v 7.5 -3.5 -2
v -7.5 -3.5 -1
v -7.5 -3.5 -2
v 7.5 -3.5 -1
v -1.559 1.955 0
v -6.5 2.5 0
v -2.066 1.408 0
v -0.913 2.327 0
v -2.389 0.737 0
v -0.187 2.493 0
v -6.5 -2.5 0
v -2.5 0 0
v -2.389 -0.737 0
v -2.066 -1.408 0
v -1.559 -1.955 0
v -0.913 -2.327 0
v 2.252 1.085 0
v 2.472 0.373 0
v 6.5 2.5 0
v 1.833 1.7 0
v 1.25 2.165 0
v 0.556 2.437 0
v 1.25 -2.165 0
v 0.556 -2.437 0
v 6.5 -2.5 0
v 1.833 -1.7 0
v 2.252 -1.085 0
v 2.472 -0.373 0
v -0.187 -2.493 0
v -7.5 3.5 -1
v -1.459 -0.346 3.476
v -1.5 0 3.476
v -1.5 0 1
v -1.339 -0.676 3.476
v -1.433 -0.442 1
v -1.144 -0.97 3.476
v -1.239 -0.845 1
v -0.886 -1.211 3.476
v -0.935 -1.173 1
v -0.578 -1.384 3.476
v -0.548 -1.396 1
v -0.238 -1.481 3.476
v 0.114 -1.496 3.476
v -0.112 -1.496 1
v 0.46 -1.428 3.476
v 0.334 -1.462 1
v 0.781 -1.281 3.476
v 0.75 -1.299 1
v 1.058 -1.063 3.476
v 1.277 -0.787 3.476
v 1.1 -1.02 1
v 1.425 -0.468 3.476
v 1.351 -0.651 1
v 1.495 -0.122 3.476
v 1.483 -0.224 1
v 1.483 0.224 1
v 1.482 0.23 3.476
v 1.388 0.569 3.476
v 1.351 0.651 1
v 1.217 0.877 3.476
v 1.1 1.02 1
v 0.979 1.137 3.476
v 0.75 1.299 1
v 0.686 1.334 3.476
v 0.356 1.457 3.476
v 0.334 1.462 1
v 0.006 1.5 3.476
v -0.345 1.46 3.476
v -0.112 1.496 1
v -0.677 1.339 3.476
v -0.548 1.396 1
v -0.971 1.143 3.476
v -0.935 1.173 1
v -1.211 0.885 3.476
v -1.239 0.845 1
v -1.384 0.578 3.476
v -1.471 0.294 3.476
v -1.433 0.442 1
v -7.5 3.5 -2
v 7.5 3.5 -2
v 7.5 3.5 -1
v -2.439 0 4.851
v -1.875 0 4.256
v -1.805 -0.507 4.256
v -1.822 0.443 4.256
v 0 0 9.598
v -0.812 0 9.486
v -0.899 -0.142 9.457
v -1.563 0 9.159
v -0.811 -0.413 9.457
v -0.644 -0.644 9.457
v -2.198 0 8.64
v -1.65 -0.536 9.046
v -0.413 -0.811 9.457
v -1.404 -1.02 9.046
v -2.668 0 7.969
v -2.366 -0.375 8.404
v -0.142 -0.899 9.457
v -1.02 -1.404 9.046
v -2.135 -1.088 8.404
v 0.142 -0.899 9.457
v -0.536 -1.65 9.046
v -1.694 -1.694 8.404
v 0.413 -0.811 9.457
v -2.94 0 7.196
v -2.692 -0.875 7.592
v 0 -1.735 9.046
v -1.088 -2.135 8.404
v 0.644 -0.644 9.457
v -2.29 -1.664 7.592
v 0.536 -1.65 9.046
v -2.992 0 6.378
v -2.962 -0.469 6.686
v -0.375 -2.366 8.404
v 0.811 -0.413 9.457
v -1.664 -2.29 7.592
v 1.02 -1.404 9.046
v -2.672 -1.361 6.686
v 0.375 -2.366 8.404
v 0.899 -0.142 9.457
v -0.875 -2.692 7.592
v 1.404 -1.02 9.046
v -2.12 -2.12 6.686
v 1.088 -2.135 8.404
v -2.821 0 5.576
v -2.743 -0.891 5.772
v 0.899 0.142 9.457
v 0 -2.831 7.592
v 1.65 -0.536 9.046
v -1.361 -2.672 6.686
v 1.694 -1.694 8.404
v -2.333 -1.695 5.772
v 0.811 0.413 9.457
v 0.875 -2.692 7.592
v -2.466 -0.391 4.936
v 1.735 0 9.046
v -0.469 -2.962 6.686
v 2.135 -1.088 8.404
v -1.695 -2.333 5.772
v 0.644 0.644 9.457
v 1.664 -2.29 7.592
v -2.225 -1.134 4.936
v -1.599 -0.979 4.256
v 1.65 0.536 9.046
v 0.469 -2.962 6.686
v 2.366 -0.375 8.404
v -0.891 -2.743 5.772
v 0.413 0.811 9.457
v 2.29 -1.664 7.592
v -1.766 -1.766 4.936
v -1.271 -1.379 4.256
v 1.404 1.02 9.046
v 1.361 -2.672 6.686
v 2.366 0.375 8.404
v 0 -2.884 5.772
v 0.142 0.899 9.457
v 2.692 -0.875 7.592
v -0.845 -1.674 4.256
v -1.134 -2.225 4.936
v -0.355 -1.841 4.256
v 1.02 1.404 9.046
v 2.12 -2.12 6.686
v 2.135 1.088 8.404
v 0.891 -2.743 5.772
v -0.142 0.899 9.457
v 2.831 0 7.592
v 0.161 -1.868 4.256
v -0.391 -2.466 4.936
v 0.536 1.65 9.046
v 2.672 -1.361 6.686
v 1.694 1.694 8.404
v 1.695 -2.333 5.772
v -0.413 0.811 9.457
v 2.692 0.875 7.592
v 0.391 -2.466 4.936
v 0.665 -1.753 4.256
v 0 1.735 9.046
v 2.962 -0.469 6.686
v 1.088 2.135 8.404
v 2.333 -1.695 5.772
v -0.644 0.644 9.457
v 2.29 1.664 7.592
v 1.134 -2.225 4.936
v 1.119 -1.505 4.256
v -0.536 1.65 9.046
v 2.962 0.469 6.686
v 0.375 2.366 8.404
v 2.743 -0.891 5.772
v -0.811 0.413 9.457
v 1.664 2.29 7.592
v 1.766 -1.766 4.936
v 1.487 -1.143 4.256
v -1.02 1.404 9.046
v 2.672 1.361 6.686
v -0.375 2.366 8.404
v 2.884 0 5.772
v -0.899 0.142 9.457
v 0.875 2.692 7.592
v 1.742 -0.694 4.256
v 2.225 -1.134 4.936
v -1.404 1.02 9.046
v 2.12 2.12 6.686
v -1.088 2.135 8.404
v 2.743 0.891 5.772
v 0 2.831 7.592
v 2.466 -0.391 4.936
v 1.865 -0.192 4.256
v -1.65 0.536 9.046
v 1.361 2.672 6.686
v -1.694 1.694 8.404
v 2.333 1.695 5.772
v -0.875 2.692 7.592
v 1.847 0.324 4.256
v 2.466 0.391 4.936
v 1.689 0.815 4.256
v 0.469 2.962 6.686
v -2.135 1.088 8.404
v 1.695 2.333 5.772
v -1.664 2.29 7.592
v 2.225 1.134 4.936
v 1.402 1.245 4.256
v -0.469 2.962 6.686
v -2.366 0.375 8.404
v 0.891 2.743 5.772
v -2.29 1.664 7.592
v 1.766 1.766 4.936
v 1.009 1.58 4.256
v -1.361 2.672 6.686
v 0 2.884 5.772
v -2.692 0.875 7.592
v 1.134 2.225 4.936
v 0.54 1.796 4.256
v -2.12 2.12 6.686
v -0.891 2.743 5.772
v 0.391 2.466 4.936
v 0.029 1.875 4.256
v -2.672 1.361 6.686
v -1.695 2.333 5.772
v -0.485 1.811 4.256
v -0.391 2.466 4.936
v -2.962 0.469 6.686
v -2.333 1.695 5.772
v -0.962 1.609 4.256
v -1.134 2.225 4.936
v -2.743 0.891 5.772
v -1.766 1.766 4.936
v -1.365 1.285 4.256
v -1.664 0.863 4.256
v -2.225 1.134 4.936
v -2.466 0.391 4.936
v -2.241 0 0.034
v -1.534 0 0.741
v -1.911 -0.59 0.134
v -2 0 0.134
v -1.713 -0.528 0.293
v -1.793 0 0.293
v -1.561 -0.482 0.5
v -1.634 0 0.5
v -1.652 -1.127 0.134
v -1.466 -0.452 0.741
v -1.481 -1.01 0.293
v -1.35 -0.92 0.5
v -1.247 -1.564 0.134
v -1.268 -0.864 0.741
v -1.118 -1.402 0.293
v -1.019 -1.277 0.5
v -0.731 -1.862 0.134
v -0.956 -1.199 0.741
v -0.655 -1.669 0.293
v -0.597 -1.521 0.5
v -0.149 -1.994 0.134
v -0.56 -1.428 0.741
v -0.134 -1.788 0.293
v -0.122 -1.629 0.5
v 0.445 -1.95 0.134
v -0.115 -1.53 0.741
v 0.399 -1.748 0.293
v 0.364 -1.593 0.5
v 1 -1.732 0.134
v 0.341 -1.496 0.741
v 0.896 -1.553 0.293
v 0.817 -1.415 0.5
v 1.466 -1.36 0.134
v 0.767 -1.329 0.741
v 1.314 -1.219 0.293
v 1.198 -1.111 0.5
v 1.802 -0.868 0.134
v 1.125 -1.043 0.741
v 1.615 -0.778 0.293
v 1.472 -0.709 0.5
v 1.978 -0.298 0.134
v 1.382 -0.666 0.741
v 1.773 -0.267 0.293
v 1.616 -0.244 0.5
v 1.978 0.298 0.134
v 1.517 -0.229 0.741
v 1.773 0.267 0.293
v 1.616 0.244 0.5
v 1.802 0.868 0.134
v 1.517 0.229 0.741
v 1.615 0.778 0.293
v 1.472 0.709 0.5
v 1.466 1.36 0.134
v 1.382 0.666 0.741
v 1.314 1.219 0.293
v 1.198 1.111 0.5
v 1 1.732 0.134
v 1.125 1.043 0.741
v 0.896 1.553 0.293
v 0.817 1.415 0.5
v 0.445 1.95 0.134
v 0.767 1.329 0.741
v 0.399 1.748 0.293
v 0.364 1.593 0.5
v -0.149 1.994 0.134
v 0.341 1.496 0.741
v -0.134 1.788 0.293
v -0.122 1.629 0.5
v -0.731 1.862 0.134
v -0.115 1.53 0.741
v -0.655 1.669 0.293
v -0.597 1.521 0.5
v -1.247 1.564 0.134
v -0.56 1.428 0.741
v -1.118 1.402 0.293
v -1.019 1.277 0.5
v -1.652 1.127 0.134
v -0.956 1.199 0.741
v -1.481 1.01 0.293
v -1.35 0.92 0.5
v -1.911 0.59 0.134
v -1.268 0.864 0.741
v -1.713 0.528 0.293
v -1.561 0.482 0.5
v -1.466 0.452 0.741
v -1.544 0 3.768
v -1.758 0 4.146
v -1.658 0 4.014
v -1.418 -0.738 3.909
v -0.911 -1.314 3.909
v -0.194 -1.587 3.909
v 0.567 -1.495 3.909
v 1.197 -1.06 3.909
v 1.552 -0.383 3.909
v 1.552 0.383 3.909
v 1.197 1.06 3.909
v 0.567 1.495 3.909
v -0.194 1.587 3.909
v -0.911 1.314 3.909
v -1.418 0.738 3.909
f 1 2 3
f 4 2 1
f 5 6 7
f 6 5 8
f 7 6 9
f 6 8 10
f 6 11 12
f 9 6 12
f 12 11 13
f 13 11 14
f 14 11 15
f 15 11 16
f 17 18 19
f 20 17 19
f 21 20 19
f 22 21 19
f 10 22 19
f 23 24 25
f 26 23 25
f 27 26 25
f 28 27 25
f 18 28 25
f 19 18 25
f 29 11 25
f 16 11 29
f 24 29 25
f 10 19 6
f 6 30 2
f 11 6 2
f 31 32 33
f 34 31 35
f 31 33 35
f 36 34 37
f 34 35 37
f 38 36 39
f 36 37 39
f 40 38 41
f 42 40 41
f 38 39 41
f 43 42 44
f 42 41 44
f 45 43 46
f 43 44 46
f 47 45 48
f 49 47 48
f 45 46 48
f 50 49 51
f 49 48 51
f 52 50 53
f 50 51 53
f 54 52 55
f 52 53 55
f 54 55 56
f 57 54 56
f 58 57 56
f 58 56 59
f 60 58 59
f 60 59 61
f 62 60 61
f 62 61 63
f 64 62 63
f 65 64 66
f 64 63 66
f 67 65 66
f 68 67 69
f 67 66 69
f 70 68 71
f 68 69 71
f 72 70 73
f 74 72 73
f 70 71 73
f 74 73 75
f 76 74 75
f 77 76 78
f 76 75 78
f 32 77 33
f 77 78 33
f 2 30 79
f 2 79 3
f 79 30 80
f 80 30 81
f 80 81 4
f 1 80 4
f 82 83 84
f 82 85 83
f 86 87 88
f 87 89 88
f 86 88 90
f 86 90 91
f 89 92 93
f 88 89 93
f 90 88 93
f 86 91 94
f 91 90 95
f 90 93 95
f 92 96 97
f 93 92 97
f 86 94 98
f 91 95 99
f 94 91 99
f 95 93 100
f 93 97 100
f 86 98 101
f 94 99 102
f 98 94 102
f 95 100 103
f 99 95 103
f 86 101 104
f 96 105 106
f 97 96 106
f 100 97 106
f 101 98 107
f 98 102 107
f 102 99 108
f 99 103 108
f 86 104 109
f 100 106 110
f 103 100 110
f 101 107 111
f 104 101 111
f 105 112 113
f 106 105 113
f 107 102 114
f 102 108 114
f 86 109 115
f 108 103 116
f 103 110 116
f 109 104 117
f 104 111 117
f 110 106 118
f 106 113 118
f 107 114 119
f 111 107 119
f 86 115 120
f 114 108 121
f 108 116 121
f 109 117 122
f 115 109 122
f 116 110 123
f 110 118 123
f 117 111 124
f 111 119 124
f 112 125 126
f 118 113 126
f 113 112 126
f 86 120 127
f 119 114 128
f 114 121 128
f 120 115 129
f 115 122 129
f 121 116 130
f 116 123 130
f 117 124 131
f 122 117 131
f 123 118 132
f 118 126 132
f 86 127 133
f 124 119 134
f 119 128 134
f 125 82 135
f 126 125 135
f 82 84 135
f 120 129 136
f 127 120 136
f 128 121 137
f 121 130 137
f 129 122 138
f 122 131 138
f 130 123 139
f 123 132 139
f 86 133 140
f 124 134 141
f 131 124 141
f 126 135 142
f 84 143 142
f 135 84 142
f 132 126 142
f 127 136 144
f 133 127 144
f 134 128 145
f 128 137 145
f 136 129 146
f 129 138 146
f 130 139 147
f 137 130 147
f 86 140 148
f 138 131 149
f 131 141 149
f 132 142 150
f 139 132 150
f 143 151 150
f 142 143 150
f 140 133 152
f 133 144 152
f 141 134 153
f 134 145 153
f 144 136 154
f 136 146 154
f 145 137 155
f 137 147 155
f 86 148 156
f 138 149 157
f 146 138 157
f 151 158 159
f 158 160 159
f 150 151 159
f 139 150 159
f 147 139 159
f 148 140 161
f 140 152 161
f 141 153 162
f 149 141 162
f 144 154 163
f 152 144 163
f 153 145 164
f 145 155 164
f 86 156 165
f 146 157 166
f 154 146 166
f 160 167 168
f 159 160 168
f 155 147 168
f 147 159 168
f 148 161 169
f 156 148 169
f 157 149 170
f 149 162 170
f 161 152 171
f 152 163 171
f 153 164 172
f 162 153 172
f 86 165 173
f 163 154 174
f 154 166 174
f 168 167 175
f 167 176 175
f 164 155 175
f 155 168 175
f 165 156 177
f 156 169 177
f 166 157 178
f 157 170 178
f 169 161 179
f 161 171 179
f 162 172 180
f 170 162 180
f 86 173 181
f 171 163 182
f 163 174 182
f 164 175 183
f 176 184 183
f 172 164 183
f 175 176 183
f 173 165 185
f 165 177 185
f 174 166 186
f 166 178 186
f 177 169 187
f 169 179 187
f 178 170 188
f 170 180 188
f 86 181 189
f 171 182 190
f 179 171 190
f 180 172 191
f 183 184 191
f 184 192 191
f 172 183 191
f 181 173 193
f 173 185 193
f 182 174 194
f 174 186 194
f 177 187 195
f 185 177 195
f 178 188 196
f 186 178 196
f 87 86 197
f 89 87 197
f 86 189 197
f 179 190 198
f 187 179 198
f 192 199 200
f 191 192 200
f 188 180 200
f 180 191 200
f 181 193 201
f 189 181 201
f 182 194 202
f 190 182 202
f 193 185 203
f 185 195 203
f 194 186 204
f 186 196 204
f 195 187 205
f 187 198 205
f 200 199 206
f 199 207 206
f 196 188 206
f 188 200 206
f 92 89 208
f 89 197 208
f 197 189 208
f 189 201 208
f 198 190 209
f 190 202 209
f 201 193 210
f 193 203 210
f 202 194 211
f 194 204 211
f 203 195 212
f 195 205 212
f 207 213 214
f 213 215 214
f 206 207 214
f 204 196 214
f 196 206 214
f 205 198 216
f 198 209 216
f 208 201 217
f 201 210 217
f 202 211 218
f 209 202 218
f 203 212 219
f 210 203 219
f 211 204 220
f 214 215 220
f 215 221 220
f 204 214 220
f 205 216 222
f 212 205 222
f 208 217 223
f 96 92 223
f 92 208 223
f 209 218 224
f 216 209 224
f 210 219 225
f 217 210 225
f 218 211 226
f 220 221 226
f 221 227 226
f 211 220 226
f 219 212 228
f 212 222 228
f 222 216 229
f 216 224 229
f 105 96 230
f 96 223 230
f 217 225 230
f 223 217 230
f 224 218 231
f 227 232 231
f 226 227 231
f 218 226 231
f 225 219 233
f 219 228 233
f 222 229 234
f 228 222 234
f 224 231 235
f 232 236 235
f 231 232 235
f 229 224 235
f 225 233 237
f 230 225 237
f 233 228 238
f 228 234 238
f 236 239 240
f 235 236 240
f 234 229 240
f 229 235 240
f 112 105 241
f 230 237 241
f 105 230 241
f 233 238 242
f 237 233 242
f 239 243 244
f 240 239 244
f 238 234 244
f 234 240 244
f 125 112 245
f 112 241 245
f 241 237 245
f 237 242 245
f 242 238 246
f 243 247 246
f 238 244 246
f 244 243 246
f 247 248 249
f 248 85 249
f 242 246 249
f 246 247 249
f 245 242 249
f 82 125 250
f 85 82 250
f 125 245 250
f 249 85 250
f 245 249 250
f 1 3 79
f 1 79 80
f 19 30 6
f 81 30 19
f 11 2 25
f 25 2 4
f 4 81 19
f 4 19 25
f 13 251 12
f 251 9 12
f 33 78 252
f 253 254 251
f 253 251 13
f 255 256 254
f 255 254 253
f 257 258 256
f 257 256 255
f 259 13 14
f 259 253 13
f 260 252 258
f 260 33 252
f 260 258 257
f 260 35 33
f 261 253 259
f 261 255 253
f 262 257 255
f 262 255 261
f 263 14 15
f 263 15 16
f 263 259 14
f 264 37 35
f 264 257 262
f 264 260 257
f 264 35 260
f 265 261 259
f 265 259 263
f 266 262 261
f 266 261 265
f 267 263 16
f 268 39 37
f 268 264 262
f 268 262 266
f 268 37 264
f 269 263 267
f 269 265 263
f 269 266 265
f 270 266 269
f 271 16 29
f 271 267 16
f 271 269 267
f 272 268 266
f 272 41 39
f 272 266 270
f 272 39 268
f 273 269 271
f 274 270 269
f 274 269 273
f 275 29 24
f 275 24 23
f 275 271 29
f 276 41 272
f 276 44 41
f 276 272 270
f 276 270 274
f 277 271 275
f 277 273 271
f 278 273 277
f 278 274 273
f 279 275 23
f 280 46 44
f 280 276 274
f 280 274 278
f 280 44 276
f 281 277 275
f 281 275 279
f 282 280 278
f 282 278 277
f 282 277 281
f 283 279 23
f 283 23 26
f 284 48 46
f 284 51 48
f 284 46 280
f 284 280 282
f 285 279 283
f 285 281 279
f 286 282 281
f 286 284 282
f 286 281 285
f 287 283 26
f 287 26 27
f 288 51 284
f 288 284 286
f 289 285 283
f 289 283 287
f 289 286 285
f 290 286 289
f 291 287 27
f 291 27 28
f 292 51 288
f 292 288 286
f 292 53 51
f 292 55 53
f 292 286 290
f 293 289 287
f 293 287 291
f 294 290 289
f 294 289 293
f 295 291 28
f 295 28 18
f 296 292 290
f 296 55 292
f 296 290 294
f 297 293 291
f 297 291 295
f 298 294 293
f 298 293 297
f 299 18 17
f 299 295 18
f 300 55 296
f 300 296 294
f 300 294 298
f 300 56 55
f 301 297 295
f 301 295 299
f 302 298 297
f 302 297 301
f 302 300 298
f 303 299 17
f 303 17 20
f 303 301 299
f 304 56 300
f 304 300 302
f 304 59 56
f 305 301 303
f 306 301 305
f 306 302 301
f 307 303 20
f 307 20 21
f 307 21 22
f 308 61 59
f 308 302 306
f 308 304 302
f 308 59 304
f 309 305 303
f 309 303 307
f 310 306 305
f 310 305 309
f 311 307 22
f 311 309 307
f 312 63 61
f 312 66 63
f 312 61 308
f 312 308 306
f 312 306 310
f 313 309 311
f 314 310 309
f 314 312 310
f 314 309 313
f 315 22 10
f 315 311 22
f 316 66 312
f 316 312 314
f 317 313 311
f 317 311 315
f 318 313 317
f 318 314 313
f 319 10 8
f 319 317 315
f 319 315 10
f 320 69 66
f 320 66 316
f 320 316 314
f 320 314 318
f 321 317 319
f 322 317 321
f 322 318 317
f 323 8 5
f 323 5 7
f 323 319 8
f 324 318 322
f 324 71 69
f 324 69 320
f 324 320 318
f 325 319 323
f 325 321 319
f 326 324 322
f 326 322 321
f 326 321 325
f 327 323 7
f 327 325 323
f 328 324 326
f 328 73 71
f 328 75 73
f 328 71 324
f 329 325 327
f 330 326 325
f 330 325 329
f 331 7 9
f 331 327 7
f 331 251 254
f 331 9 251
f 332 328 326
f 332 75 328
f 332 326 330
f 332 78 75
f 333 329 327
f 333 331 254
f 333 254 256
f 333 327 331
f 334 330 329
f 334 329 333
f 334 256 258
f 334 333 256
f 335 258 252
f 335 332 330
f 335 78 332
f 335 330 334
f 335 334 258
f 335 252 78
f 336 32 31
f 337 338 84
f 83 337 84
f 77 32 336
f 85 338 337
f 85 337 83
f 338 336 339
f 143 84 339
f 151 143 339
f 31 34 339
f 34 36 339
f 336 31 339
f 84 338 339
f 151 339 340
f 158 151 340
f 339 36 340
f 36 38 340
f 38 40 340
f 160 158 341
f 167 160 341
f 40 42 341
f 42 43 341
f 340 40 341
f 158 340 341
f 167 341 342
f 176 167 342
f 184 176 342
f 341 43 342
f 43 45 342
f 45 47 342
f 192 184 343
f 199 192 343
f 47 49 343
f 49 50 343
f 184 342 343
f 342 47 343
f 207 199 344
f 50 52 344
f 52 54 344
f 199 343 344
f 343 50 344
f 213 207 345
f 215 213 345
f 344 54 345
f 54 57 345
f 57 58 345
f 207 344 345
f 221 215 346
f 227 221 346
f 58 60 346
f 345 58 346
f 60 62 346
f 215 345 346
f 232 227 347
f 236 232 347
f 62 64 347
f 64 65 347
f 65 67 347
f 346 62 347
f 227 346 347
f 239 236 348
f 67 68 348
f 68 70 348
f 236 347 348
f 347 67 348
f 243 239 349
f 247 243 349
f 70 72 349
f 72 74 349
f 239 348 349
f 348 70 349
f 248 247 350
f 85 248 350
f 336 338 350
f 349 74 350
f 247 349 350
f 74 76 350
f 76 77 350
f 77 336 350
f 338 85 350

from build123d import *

# Parameters (mm, degrees)
F2_W     = 15
F2_H     = 7
F2_R     = 1.5
F3_DEPTH = 2.000000095
F4_R     = 1
F5_SIZE  = 0.99999


# Not quite as in the source:
# - a fillet or chamfer is up to 0.001 mm smaller than in the source, because OpenCascade refuses the exact size


with BuildPart() as f1:
    # F0 (on Front) → F1 (revolve)
    with BuildSketch(Plane.XZ):
        with BuildLine():
            Line((-1.5, 4), (-1.5, 0))
            Line((-1.5, 0), (0, 0))
            Line((0, 0), (0, 9.5980762114))
            ThreePointArc((0, 9.5980762114), (-2.8977774789, 7.3745333467), (-1.5, 4))
        make_face()
    revolve(axis=Axis((0, 0, 4.7990381057), (0, 0, 1)))

    # F2 (on face) → F3 (join)
    with BuildSketch(Plane(origin=(0, 0, 0), x_dir=(1, 0, 0), z_dir=(0, 0, -1))):
        Rectangle(F2_W, F2_H)
        Circle(F2_R, mode=Mode.SUBTRACT)
        Circle(F2_R)
    extrude(amount=F3_DEPTH)

    # F4
    f4_edges = [f1.edges().sort_by_distance(p)[0] for p in [
        (1.5, 0, 0),
        (1.5, 0, 4),
    ]]
    fillet(f4_edges, radius=F4_R)

    # F5 (size 1 in the source; OpenCascade refuses exactly that, so slightly less here)
    f5_edges = [f1.edges().sort_by_distance(p)[0] for p in [
        (2.5, 0, 0),
        (7.5, 0, 0),
        (0, 3.5, 0),
        (0, -3.5, 0),
        (-7.5, 0, 0),
    ]]
    chamfer(f5_edges, length=F5_SIZE)


solid = f1.part
